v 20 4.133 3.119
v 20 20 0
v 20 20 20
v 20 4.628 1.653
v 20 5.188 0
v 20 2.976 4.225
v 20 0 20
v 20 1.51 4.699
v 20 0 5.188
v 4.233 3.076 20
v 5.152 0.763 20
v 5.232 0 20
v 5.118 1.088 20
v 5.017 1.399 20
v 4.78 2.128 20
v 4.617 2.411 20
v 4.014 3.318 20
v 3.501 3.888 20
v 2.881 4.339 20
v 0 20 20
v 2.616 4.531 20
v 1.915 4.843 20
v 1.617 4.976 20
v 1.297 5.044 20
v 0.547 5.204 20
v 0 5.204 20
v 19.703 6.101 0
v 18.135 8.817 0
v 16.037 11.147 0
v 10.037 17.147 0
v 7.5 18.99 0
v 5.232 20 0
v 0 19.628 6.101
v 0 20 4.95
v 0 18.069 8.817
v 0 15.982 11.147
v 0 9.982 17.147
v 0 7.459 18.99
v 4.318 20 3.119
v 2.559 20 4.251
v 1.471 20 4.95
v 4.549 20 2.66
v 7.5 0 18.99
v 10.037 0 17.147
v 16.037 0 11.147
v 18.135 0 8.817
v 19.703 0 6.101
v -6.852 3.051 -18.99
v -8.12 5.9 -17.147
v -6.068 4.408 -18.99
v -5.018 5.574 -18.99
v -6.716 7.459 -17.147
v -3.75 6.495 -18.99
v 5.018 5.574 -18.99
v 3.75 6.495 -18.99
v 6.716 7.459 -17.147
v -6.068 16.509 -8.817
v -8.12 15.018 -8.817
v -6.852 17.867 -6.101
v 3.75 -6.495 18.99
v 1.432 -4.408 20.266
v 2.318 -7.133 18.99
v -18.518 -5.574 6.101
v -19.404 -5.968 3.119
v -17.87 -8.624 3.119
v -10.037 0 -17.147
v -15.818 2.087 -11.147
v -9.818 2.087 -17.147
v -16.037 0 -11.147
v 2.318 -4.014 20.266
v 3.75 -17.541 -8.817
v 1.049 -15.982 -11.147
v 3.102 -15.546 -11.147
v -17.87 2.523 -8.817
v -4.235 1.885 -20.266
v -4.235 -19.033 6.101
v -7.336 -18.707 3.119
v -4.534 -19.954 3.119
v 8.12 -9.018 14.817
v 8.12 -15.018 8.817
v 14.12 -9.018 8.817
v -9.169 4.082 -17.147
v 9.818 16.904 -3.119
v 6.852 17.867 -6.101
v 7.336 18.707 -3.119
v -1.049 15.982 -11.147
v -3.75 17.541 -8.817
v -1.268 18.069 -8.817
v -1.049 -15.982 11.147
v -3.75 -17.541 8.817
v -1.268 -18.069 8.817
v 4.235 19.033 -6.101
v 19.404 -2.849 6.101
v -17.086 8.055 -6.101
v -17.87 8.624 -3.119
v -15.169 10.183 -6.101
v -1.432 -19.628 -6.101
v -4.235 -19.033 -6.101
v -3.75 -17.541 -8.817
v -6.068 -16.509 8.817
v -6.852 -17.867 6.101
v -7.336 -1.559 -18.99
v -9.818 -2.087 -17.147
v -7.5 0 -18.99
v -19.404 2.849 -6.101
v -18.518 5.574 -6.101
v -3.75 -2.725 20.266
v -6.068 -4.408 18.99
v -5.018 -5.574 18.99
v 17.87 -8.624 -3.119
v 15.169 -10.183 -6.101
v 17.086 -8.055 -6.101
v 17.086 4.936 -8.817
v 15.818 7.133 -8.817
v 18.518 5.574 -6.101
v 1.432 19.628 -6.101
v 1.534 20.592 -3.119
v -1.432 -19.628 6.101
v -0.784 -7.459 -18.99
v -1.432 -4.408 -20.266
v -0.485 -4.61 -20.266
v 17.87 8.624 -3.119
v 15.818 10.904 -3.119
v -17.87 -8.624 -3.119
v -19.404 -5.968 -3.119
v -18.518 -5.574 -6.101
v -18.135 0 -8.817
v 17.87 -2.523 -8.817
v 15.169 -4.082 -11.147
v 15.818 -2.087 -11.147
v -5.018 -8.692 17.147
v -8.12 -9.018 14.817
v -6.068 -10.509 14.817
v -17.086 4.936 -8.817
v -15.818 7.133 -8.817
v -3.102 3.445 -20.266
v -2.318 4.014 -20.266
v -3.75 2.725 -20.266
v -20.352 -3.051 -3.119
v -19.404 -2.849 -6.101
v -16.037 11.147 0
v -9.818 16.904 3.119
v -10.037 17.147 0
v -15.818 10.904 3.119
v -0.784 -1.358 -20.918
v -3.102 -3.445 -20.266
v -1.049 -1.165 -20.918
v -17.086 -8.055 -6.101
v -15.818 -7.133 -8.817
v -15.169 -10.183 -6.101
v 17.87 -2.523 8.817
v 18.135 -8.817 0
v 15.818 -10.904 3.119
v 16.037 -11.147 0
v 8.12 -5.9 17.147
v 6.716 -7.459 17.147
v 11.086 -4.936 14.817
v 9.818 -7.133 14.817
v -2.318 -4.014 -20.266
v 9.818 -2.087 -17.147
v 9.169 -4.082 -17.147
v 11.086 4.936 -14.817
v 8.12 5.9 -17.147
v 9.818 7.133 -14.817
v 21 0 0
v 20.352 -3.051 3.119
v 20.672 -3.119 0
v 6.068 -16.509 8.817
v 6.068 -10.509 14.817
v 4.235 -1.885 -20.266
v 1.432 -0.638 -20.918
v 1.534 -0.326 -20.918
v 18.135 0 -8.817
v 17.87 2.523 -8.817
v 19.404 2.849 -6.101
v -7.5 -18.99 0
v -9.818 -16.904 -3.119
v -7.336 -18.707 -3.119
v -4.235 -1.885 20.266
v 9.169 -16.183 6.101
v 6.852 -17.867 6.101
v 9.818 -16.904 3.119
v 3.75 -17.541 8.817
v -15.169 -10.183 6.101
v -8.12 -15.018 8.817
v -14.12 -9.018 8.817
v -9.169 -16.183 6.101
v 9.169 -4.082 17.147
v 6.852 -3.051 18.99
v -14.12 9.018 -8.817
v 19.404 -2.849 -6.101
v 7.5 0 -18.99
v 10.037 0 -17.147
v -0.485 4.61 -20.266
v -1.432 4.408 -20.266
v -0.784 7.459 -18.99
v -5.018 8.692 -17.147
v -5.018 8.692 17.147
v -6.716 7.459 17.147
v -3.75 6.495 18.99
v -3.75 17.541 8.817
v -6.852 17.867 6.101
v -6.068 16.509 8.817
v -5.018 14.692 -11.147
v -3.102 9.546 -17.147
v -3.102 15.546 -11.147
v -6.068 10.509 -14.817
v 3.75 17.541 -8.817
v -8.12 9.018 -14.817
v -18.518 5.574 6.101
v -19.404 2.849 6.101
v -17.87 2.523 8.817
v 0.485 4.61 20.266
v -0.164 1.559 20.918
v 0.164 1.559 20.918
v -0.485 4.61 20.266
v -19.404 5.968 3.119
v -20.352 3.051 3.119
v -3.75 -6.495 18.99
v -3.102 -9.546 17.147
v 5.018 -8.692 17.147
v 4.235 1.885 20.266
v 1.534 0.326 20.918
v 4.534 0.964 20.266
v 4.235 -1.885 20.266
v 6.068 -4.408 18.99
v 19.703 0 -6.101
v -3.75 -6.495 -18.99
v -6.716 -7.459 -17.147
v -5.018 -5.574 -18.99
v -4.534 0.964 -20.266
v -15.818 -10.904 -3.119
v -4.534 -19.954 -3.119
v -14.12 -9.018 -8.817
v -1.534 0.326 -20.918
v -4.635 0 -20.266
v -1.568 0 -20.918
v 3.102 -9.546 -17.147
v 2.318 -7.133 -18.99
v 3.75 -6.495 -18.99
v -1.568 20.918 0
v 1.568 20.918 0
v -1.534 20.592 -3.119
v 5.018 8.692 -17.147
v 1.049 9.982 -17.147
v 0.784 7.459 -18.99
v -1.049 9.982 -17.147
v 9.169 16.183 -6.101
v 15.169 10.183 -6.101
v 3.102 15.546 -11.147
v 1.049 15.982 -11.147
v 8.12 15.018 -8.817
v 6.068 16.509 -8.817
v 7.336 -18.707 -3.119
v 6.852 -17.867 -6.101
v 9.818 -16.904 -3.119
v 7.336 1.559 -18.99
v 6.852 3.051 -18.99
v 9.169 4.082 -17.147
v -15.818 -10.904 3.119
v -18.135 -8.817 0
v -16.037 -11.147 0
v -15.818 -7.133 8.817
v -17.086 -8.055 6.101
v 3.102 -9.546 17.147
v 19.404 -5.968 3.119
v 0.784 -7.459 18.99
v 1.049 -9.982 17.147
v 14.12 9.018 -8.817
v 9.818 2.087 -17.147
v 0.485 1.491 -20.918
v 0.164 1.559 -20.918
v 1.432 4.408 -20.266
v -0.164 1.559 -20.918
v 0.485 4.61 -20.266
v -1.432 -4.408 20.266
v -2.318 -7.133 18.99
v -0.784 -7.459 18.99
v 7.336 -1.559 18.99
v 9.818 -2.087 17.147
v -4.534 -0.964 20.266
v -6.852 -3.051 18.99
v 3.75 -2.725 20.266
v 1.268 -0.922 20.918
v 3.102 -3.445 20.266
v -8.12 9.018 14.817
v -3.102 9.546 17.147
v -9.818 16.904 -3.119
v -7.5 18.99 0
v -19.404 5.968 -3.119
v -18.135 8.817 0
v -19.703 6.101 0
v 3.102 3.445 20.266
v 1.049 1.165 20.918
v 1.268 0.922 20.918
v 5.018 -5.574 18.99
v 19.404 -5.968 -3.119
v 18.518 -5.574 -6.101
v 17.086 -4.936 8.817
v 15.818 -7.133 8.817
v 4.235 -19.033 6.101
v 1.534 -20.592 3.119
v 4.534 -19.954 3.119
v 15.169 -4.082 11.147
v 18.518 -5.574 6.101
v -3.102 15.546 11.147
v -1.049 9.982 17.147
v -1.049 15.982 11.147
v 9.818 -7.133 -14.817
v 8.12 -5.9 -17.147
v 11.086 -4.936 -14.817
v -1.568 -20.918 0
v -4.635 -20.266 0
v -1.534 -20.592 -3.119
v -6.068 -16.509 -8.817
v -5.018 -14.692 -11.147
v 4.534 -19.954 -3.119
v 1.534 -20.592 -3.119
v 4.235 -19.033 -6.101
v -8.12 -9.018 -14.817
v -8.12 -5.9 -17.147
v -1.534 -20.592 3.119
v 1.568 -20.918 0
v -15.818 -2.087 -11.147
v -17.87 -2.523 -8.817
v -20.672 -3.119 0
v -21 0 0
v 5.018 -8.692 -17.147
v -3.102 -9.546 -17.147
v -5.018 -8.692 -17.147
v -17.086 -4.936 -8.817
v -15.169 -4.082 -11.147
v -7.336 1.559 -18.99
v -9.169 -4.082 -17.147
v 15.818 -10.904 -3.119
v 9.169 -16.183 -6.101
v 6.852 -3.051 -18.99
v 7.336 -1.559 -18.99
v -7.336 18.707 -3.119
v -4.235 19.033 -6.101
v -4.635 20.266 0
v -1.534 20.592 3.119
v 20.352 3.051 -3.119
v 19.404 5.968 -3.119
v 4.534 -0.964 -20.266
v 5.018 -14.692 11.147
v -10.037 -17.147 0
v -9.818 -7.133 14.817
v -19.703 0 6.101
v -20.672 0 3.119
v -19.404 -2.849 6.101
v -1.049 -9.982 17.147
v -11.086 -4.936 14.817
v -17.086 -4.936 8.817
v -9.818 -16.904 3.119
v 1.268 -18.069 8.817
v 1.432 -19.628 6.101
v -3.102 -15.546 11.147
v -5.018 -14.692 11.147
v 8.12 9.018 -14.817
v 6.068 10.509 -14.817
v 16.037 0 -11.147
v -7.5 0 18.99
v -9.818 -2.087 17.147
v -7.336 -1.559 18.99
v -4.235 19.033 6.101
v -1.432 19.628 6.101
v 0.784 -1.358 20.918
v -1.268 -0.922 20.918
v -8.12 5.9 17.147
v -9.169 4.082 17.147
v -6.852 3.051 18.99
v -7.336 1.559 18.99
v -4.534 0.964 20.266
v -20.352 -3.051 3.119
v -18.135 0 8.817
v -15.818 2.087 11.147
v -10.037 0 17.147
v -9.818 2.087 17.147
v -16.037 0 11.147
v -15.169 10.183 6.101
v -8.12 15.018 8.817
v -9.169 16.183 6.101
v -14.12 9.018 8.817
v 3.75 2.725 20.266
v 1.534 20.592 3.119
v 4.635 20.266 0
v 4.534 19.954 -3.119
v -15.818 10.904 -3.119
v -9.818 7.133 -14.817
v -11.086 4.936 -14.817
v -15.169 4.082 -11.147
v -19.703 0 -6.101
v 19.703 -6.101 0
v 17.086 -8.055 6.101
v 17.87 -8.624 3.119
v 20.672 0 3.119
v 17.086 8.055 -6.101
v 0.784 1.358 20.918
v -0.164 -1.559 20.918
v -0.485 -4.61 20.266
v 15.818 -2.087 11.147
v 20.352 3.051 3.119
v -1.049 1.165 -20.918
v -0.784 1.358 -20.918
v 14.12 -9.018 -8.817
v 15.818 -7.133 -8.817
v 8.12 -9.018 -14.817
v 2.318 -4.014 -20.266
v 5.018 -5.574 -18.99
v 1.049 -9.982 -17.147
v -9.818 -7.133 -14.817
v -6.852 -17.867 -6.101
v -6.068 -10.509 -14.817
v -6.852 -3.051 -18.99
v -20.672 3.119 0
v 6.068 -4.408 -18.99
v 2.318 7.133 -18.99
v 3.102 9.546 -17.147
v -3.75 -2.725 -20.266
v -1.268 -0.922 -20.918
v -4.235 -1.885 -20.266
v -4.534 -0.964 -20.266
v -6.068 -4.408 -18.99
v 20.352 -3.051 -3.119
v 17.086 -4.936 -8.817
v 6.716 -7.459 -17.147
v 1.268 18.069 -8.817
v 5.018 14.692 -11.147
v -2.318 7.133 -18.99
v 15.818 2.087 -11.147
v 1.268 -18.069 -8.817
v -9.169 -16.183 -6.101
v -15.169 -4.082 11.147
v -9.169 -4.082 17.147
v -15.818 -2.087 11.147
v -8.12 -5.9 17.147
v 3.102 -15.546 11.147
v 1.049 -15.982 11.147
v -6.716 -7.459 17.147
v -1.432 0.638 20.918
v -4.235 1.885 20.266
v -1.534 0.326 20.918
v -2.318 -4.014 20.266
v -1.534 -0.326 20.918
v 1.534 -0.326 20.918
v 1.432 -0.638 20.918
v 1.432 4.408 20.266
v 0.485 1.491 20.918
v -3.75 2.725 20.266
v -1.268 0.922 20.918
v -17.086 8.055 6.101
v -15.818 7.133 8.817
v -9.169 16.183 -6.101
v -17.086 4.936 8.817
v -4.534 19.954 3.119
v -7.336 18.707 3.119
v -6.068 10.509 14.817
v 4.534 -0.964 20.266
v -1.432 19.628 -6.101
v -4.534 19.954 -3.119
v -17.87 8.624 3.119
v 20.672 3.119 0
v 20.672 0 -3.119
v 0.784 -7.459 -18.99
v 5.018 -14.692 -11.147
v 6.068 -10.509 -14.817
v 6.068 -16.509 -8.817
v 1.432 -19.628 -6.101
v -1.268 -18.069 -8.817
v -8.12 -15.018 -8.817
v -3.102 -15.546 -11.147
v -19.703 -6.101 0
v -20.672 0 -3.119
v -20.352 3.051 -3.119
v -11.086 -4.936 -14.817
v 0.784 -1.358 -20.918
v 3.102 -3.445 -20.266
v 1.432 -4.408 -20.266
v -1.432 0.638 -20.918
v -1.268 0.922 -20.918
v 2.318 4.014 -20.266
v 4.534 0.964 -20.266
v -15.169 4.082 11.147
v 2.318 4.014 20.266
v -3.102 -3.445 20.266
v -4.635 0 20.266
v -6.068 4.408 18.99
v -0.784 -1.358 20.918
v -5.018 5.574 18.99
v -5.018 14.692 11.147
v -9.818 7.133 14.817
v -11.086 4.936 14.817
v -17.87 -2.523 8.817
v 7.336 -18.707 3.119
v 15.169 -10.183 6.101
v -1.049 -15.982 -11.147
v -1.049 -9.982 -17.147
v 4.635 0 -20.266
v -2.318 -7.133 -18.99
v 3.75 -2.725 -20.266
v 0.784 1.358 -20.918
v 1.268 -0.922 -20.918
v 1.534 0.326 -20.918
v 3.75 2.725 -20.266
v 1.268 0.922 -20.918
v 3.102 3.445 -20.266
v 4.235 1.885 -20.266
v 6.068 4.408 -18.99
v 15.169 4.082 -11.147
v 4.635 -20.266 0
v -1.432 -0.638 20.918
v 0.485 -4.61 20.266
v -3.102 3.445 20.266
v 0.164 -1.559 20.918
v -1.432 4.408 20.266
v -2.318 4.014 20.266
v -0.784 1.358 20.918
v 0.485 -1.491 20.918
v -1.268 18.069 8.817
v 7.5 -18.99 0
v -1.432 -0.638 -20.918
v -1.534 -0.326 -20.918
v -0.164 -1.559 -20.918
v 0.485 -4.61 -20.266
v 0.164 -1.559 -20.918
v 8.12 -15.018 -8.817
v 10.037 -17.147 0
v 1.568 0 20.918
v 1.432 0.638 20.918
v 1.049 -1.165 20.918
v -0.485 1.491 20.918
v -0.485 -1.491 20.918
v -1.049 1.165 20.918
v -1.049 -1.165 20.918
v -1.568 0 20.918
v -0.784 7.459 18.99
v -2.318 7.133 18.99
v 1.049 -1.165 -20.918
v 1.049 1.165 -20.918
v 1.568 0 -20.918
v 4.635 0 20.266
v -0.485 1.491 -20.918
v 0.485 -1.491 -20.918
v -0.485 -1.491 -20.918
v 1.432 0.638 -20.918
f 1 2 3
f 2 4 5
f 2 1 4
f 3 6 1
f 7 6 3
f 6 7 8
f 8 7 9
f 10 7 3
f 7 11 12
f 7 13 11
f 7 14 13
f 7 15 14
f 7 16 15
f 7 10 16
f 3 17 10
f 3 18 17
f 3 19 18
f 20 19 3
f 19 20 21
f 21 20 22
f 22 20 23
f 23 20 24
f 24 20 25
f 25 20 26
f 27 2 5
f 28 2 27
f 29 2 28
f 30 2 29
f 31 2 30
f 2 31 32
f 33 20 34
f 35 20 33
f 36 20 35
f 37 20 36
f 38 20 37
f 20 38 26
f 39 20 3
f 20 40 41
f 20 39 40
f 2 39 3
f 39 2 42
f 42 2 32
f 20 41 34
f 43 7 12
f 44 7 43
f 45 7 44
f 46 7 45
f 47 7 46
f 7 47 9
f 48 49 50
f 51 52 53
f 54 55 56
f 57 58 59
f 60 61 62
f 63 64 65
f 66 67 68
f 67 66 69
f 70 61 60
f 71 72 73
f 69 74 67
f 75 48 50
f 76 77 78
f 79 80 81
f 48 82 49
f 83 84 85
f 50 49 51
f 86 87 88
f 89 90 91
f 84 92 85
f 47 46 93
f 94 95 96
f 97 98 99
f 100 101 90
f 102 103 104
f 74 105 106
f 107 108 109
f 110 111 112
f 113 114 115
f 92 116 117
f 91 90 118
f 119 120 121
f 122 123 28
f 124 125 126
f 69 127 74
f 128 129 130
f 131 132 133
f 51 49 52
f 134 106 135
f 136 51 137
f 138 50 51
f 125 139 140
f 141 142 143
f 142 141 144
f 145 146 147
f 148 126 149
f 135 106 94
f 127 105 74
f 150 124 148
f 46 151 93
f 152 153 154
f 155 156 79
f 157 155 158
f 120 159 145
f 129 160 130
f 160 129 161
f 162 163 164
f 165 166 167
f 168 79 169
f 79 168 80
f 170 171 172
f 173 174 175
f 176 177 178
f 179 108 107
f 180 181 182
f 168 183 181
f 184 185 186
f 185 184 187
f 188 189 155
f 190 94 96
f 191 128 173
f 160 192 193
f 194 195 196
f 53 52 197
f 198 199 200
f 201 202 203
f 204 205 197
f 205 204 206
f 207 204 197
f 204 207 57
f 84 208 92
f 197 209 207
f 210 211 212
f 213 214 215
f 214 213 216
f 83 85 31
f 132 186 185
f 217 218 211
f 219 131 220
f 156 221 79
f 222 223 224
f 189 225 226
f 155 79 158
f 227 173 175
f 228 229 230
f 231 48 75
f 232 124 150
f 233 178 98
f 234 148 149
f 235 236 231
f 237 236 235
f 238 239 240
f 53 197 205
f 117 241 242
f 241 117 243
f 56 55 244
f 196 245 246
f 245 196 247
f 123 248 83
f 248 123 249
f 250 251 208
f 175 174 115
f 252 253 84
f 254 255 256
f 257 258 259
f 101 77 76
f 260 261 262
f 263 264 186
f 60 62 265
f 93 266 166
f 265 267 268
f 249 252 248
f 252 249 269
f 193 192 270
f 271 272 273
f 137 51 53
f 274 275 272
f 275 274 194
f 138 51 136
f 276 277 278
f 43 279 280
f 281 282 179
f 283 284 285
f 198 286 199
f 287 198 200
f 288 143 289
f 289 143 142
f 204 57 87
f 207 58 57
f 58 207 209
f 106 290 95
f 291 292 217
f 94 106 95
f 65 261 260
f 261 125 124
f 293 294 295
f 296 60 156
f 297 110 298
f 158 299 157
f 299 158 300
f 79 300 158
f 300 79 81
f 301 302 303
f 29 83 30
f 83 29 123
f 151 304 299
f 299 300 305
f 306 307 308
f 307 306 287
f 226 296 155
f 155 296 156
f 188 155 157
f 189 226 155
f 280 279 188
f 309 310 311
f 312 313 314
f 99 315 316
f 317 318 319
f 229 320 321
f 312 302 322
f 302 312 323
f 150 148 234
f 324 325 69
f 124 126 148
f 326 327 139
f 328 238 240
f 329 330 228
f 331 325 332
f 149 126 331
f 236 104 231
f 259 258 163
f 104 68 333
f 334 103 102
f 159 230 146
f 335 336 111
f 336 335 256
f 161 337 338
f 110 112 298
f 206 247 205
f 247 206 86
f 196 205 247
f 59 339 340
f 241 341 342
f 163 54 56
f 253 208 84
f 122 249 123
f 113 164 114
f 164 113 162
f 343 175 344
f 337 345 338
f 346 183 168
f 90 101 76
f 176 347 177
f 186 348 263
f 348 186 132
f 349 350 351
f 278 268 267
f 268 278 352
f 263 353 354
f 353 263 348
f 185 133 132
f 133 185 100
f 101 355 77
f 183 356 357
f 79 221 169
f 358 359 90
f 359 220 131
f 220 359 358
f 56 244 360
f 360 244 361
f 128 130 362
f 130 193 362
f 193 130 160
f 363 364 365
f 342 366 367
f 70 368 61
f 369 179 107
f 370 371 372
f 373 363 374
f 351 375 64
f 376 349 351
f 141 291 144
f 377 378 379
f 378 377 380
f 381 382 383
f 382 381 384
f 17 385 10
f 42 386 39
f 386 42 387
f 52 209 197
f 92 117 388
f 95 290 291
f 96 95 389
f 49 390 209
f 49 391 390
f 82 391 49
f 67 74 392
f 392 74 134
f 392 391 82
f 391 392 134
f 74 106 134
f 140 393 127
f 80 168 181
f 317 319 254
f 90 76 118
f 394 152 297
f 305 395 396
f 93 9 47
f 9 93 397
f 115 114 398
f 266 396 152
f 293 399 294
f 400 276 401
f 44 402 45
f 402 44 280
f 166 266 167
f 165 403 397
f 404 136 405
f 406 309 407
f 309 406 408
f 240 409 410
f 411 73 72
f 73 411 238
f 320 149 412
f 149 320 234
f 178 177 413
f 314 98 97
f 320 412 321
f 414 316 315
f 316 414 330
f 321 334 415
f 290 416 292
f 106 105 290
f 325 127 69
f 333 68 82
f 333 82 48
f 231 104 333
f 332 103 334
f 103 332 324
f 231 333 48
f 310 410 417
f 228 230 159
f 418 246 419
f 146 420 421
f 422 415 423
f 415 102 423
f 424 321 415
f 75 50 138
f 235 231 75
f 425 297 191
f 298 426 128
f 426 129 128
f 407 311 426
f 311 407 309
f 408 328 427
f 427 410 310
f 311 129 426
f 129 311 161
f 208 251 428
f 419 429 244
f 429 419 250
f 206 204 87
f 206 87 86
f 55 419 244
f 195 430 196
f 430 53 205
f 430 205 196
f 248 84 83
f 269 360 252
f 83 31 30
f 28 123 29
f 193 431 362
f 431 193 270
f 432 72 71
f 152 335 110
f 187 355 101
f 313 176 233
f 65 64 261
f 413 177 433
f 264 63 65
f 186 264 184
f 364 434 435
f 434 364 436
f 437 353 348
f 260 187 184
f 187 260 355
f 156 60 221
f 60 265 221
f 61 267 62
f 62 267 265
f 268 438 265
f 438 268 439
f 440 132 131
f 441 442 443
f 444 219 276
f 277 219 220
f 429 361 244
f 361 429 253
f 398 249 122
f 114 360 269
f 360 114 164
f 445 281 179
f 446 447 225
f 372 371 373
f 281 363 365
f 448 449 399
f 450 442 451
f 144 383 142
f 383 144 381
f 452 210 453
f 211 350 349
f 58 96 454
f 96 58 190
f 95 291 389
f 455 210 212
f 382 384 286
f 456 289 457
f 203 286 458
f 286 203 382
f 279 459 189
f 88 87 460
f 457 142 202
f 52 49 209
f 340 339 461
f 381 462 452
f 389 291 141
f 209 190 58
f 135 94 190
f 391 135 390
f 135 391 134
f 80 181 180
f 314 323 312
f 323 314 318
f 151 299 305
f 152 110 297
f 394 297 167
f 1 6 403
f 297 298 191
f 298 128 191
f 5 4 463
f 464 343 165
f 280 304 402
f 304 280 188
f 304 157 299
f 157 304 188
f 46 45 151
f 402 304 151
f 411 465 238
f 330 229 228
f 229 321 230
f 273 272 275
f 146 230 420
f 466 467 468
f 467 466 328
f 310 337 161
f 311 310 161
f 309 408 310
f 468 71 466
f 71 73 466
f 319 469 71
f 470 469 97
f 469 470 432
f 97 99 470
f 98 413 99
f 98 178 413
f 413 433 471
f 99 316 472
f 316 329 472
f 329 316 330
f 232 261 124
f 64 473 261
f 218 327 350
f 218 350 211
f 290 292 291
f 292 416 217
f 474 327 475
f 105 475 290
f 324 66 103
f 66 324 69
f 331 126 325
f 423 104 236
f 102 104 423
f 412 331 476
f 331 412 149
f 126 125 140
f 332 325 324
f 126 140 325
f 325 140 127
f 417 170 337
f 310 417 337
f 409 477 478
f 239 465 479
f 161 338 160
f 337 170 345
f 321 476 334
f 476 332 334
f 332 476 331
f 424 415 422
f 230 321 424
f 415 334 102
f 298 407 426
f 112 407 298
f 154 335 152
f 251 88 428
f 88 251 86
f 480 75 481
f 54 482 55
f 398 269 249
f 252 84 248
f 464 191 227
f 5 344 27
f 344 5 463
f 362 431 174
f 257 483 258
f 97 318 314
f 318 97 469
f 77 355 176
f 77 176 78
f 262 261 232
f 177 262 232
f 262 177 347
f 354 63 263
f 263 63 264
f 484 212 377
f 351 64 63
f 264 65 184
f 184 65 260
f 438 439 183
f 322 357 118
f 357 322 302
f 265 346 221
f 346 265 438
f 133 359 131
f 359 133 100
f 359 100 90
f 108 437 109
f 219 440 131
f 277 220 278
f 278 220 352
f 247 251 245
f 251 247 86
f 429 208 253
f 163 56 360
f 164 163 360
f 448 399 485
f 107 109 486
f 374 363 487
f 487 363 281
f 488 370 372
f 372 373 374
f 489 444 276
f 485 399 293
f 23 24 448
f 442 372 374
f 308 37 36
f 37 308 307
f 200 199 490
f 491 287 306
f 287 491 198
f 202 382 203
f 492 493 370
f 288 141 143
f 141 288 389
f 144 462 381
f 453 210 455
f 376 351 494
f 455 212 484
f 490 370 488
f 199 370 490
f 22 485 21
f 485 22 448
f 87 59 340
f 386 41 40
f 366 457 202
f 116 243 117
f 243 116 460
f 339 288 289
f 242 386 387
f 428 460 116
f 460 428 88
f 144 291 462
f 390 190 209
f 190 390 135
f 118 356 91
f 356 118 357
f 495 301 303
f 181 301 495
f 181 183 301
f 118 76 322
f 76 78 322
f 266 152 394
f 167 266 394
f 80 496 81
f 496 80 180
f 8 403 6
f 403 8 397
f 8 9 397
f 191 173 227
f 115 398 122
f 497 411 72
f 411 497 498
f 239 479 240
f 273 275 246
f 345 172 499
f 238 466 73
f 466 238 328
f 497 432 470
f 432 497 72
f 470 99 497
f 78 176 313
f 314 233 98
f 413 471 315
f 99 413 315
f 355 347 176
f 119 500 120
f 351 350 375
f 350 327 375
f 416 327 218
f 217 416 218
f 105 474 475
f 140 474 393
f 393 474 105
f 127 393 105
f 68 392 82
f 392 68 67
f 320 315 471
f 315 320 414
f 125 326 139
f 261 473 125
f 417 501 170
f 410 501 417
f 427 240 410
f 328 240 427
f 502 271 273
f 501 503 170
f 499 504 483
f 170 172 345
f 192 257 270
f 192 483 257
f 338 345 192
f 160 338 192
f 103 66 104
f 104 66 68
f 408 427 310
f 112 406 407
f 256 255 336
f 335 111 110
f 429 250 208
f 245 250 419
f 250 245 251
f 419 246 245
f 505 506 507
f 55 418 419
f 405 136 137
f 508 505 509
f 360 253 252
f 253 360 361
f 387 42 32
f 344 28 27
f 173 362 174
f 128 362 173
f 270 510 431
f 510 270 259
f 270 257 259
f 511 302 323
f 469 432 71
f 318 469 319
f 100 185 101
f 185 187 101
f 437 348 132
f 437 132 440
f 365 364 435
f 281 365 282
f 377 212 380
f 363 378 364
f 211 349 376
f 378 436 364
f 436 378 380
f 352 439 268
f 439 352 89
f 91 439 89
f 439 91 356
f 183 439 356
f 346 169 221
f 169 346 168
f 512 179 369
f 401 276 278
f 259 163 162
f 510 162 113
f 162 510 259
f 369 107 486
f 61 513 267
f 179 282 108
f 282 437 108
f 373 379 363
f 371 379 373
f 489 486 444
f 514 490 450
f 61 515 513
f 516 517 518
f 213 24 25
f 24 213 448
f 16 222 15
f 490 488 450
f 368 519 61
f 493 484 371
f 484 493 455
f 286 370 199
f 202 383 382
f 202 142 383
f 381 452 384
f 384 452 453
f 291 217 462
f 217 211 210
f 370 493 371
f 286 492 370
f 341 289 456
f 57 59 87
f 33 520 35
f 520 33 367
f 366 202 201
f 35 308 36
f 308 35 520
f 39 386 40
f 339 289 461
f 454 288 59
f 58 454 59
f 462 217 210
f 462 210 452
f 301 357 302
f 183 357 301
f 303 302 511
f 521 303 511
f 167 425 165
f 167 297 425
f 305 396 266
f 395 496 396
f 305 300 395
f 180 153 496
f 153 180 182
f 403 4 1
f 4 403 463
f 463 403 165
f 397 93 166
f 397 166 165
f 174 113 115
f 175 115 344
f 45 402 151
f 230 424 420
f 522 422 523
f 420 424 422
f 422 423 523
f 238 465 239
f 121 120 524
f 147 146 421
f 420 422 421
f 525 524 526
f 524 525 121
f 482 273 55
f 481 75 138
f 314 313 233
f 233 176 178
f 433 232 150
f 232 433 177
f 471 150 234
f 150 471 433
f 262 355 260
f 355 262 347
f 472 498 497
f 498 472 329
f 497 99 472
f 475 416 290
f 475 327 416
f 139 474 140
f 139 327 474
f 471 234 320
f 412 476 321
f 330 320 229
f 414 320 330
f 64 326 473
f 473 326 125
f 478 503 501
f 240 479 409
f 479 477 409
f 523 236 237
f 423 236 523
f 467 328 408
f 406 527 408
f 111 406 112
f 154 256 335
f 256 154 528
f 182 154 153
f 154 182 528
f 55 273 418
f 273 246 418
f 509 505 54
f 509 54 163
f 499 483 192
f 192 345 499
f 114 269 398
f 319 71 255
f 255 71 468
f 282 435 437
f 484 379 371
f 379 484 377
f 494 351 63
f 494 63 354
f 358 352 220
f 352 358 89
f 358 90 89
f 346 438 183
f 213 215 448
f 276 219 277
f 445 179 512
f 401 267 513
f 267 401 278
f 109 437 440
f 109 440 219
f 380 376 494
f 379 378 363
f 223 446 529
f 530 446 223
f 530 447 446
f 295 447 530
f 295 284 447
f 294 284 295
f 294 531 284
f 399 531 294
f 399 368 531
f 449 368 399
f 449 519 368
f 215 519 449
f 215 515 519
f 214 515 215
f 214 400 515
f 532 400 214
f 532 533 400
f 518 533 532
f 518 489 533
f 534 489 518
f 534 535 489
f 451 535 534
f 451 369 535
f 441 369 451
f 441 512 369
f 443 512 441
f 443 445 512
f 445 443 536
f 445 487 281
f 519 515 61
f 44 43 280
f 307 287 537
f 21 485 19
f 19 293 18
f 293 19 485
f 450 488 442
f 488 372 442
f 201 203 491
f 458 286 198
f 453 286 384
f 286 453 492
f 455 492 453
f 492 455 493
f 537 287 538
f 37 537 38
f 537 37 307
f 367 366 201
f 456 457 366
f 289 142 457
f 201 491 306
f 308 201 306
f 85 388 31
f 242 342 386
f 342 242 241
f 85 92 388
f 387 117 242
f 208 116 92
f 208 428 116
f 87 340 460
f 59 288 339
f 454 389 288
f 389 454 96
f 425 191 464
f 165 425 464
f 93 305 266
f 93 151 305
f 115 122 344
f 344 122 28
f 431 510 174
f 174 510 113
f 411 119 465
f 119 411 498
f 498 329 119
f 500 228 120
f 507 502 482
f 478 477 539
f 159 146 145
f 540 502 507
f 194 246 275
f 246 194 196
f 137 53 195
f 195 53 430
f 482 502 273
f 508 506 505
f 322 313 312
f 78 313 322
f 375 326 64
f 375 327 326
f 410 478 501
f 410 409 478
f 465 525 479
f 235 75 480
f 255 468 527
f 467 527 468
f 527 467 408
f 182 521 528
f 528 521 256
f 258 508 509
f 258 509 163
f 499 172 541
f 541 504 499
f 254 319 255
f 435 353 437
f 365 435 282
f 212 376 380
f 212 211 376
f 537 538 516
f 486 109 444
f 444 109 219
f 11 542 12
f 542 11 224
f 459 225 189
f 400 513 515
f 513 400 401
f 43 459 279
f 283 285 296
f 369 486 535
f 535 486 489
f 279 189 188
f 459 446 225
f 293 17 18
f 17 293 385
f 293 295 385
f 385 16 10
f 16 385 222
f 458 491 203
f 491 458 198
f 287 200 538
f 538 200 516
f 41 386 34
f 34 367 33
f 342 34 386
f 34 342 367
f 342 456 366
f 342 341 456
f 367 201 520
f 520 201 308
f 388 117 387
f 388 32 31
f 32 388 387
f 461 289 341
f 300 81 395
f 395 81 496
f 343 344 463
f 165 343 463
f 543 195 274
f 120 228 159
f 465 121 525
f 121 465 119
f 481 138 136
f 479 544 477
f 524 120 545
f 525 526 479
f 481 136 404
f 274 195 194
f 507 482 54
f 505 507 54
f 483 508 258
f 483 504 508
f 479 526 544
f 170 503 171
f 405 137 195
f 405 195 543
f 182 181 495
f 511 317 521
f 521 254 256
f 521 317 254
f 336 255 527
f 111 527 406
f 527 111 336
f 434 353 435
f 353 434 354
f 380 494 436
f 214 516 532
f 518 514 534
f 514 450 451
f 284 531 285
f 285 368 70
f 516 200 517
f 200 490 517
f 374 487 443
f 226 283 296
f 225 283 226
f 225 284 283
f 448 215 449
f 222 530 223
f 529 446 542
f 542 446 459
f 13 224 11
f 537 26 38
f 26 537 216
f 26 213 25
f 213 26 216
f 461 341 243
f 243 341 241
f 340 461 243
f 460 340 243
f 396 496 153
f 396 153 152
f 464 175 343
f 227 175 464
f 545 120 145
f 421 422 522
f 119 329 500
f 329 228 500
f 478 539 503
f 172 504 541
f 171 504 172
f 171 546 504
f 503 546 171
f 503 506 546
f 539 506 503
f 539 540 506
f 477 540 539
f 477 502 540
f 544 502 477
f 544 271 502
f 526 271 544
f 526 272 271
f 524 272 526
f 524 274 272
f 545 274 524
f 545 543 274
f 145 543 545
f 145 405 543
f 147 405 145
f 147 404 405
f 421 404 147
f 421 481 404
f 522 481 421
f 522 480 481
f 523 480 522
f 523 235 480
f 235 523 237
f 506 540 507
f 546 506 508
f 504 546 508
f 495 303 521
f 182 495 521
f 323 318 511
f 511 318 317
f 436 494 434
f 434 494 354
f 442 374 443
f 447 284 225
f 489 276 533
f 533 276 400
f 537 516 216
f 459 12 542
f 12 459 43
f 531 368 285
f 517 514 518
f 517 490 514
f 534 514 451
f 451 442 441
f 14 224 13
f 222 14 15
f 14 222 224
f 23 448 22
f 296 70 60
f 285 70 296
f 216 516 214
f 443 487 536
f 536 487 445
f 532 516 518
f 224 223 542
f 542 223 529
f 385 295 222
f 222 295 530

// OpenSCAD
cube([20,20,20]);
hull(){
 sphere(r=15);
 translate([6,0,0])sphere(r=15);
 translate([-6,0,0])sphere(r=15);
 translate([0,6,0])sphere(r=15);
 translate([0,-6,0])sphere(r=15);
 translate([0,0,6])sphere(r=15);
 translate([0,0,-6])sphere(r=15);
}
